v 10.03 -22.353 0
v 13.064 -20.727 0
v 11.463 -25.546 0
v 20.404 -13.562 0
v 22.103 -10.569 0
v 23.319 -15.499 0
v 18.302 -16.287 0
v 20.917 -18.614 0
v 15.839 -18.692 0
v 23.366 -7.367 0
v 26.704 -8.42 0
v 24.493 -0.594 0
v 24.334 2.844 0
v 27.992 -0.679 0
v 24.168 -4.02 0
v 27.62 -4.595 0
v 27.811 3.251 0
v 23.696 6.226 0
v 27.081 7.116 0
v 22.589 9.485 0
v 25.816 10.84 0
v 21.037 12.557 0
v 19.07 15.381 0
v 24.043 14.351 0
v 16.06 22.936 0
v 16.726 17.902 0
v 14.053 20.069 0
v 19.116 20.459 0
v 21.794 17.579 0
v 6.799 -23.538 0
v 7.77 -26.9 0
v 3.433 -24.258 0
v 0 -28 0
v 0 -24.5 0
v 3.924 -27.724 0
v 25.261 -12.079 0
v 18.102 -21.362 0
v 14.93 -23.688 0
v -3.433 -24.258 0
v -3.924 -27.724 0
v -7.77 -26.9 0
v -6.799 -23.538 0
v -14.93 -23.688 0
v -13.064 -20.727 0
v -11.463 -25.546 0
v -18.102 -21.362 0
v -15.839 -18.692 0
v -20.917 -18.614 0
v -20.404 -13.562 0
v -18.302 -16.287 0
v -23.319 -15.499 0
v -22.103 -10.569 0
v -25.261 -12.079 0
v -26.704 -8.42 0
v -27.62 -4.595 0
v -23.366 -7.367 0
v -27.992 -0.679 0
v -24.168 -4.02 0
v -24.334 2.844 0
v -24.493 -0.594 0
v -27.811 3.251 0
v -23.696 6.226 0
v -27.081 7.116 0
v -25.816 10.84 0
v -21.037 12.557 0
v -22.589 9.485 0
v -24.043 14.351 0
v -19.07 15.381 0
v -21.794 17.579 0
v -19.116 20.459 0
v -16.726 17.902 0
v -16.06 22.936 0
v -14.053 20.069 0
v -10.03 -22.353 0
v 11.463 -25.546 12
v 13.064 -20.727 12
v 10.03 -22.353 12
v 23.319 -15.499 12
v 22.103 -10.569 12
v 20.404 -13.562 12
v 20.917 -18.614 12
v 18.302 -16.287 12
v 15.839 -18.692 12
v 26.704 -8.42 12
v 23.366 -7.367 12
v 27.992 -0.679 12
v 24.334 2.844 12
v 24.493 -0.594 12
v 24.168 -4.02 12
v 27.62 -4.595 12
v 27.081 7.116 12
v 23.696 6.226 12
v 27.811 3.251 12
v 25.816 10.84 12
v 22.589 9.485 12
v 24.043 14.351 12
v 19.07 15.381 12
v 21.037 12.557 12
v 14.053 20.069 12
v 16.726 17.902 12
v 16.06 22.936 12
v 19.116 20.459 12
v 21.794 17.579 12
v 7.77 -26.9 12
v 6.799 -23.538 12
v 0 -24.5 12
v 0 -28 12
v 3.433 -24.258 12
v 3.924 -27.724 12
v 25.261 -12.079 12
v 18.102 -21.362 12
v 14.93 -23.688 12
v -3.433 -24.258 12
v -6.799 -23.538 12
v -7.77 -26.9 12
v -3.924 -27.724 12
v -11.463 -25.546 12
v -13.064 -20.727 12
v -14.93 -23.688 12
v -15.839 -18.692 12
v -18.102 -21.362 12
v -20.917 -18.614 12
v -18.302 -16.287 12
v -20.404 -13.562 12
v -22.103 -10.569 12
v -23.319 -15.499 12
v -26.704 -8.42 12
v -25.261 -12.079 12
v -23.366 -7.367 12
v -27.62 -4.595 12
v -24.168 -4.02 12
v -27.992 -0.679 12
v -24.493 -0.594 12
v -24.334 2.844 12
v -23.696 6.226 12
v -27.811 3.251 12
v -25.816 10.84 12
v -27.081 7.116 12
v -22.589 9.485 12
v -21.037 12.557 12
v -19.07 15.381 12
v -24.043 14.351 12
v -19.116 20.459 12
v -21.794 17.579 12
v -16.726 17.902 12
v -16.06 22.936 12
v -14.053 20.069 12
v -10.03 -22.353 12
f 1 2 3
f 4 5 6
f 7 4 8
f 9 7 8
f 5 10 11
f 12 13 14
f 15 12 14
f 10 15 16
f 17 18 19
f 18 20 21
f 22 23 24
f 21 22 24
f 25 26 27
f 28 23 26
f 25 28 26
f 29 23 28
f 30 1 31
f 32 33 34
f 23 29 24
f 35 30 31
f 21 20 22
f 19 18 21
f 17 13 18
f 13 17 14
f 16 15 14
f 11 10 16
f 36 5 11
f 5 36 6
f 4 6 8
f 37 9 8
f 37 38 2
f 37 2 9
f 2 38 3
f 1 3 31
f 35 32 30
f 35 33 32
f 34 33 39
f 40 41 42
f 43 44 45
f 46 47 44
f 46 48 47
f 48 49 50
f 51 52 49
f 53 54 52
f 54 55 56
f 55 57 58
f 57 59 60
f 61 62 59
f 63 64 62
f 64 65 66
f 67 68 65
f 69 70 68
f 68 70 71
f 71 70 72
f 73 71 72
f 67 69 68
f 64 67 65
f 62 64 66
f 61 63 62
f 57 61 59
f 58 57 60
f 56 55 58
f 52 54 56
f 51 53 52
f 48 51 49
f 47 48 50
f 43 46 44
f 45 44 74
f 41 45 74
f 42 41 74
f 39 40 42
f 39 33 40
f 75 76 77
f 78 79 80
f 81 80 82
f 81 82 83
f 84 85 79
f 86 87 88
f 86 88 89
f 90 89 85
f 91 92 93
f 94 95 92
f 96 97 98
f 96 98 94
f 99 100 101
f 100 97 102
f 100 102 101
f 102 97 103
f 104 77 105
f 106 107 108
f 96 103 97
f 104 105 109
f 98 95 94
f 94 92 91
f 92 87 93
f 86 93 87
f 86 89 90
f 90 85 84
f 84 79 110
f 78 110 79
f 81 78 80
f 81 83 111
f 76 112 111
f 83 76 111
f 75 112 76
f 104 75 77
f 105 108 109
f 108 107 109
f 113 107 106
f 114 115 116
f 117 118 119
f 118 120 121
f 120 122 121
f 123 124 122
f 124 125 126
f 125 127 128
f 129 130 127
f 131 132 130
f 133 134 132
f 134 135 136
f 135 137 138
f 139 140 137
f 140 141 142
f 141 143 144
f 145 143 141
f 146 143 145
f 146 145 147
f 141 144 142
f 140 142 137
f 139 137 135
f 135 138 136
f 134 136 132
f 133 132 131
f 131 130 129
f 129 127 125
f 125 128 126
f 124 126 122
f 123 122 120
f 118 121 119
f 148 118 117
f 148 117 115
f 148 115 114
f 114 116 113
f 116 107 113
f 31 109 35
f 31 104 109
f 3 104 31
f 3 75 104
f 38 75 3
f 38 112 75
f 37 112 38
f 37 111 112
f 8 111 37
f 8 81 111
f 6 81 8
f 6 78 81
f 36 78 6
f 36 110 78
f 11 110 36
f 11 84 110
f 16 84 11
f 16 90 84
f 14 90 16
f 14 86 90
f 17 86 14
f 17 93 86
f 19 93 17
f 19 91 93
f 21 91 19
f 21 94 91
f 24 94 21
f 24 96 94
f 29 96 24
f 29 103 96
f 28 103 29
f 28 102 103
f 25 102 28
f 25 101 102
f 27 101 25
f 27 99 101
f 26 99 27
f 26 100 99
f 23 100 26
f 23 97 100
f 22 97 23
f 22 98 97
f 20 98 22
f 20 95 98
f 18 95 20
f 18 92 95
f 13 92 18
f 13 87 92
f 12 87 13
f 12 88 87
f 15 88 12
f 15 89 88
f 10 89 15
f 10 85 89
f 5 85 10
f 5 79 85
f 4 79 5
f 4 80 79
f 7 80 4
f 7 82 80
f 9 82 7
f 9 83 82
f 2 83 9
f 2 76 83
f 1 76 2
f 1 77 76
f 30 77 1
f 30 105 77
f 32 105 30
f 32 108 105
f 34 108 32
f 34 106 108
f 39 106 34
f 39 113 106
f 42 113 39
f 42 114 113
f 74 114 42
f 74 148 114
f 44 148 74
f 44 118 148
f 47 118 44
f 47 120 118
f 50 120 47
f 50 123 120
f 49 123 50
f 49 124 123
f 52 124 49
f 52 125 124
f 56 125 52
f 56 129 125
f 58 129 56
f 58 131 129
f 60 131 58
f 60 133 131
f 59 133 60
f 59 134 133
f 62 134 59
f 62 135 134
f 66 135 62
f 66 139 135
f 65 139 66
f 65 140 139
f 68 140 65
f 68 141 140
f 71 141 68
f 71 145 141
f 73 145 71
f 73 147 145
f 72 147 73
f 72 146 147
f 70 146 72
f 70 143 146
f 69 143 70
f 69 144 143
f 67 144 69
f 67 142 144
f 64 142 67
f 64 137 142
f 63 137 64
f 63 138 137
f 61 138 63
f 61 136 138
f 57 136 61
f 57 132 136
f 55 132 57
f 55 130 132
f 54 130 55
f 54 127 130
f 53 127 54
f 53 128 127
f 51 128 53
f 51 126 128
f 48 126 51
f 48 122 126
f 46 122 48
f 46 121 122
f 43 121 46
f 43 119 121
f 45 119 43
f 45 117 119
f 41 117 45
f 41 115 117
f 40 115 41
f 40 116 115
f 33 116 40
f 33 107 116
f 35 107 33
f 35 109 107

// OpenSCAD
$fn = 32;

// ----------------------------------------------------------------------
// Spring clip: 56 mm outside, 3.5 mm band, 70 degree opening
// ----------------------------------------------------------------------

// --- parameters (mm) ---
outer_r = 28;             // clip outside radius
inner_r = 24.5;           // clip bore radius
band = 3.5;               // band thickness
clip_w = 12;              // clip width
opening = 70;             // opening angle

clip_profile = [[-16.06, 22.936], [-19.116, 20.459], [-21.794, 17.579], [-24.043, 14.351], [-25.816, 10.84], [-27.081, 7.116], [-27.811, 3.251], [-27.992, -0.679], [-27.62, -4.595], [-26.704, -8.42], [-25.261, -12.079], [-23.319, -15.499], [-20.917, -18.614], [-18.102, -21.362], [-14.93, -23.688], [-11.463, -25.546], [-7.77, -26.9], [-3.924, -27.724], [0, -28], [3.924, -27.724], [7.77, -26.9], [11.463, -25.546], [14.93, -23.688], [18.102, -21.362], [20.917, -18.614], [23.319, -15.499], [25.261, -12.079], [26.704, -8.42], [27.62, -4.595], [27.992, -0.679], [27.811, 3.251], [27.081, 7.116], [25.816, 10.84], [24.043, 14.351], [21.794, 17.579], [19.116, 20.459], [16.06, 22.936], [14.053, 20.069], [16.726, 17.902], [19.07, 15.381], [21.037, 12.557], [22.589, 9.485], [23.696, 6.226], [24.334, 2.844], [24.493, -0.594], [24.168, -4.02], [23.366, -7.367], [22.103, -10.569], [20.404, -13.562], [18.302, -16.287], [15.839, -18.692], [13.064, -20.727], [10.03, -22.353], [6.799, -23.538], [3.433, -24.258], [0, -24.5], [-3.433, -24.258], [-6.799, -23.538], [-10.03, -22.353], [-13.064, -20.727], [-15.839, -18.692], [-18.302, -16.287], [-20.404, -13.562], [-22.103, -10.569], [-23.366, -7.367], [-24.168, -4.02], [-24.493, -0.594], [-24.334, 2.844], [-23.696, 6.226], [-22.589, 9.485], [-21.037, 12.557], [-19.07, 15.381], [-16.726, 17.902], [-14.053, 20.069]];

difference() {
  union() {
    linear_extrude(height = clip_w) polygon(clip_profile);
  }
}
